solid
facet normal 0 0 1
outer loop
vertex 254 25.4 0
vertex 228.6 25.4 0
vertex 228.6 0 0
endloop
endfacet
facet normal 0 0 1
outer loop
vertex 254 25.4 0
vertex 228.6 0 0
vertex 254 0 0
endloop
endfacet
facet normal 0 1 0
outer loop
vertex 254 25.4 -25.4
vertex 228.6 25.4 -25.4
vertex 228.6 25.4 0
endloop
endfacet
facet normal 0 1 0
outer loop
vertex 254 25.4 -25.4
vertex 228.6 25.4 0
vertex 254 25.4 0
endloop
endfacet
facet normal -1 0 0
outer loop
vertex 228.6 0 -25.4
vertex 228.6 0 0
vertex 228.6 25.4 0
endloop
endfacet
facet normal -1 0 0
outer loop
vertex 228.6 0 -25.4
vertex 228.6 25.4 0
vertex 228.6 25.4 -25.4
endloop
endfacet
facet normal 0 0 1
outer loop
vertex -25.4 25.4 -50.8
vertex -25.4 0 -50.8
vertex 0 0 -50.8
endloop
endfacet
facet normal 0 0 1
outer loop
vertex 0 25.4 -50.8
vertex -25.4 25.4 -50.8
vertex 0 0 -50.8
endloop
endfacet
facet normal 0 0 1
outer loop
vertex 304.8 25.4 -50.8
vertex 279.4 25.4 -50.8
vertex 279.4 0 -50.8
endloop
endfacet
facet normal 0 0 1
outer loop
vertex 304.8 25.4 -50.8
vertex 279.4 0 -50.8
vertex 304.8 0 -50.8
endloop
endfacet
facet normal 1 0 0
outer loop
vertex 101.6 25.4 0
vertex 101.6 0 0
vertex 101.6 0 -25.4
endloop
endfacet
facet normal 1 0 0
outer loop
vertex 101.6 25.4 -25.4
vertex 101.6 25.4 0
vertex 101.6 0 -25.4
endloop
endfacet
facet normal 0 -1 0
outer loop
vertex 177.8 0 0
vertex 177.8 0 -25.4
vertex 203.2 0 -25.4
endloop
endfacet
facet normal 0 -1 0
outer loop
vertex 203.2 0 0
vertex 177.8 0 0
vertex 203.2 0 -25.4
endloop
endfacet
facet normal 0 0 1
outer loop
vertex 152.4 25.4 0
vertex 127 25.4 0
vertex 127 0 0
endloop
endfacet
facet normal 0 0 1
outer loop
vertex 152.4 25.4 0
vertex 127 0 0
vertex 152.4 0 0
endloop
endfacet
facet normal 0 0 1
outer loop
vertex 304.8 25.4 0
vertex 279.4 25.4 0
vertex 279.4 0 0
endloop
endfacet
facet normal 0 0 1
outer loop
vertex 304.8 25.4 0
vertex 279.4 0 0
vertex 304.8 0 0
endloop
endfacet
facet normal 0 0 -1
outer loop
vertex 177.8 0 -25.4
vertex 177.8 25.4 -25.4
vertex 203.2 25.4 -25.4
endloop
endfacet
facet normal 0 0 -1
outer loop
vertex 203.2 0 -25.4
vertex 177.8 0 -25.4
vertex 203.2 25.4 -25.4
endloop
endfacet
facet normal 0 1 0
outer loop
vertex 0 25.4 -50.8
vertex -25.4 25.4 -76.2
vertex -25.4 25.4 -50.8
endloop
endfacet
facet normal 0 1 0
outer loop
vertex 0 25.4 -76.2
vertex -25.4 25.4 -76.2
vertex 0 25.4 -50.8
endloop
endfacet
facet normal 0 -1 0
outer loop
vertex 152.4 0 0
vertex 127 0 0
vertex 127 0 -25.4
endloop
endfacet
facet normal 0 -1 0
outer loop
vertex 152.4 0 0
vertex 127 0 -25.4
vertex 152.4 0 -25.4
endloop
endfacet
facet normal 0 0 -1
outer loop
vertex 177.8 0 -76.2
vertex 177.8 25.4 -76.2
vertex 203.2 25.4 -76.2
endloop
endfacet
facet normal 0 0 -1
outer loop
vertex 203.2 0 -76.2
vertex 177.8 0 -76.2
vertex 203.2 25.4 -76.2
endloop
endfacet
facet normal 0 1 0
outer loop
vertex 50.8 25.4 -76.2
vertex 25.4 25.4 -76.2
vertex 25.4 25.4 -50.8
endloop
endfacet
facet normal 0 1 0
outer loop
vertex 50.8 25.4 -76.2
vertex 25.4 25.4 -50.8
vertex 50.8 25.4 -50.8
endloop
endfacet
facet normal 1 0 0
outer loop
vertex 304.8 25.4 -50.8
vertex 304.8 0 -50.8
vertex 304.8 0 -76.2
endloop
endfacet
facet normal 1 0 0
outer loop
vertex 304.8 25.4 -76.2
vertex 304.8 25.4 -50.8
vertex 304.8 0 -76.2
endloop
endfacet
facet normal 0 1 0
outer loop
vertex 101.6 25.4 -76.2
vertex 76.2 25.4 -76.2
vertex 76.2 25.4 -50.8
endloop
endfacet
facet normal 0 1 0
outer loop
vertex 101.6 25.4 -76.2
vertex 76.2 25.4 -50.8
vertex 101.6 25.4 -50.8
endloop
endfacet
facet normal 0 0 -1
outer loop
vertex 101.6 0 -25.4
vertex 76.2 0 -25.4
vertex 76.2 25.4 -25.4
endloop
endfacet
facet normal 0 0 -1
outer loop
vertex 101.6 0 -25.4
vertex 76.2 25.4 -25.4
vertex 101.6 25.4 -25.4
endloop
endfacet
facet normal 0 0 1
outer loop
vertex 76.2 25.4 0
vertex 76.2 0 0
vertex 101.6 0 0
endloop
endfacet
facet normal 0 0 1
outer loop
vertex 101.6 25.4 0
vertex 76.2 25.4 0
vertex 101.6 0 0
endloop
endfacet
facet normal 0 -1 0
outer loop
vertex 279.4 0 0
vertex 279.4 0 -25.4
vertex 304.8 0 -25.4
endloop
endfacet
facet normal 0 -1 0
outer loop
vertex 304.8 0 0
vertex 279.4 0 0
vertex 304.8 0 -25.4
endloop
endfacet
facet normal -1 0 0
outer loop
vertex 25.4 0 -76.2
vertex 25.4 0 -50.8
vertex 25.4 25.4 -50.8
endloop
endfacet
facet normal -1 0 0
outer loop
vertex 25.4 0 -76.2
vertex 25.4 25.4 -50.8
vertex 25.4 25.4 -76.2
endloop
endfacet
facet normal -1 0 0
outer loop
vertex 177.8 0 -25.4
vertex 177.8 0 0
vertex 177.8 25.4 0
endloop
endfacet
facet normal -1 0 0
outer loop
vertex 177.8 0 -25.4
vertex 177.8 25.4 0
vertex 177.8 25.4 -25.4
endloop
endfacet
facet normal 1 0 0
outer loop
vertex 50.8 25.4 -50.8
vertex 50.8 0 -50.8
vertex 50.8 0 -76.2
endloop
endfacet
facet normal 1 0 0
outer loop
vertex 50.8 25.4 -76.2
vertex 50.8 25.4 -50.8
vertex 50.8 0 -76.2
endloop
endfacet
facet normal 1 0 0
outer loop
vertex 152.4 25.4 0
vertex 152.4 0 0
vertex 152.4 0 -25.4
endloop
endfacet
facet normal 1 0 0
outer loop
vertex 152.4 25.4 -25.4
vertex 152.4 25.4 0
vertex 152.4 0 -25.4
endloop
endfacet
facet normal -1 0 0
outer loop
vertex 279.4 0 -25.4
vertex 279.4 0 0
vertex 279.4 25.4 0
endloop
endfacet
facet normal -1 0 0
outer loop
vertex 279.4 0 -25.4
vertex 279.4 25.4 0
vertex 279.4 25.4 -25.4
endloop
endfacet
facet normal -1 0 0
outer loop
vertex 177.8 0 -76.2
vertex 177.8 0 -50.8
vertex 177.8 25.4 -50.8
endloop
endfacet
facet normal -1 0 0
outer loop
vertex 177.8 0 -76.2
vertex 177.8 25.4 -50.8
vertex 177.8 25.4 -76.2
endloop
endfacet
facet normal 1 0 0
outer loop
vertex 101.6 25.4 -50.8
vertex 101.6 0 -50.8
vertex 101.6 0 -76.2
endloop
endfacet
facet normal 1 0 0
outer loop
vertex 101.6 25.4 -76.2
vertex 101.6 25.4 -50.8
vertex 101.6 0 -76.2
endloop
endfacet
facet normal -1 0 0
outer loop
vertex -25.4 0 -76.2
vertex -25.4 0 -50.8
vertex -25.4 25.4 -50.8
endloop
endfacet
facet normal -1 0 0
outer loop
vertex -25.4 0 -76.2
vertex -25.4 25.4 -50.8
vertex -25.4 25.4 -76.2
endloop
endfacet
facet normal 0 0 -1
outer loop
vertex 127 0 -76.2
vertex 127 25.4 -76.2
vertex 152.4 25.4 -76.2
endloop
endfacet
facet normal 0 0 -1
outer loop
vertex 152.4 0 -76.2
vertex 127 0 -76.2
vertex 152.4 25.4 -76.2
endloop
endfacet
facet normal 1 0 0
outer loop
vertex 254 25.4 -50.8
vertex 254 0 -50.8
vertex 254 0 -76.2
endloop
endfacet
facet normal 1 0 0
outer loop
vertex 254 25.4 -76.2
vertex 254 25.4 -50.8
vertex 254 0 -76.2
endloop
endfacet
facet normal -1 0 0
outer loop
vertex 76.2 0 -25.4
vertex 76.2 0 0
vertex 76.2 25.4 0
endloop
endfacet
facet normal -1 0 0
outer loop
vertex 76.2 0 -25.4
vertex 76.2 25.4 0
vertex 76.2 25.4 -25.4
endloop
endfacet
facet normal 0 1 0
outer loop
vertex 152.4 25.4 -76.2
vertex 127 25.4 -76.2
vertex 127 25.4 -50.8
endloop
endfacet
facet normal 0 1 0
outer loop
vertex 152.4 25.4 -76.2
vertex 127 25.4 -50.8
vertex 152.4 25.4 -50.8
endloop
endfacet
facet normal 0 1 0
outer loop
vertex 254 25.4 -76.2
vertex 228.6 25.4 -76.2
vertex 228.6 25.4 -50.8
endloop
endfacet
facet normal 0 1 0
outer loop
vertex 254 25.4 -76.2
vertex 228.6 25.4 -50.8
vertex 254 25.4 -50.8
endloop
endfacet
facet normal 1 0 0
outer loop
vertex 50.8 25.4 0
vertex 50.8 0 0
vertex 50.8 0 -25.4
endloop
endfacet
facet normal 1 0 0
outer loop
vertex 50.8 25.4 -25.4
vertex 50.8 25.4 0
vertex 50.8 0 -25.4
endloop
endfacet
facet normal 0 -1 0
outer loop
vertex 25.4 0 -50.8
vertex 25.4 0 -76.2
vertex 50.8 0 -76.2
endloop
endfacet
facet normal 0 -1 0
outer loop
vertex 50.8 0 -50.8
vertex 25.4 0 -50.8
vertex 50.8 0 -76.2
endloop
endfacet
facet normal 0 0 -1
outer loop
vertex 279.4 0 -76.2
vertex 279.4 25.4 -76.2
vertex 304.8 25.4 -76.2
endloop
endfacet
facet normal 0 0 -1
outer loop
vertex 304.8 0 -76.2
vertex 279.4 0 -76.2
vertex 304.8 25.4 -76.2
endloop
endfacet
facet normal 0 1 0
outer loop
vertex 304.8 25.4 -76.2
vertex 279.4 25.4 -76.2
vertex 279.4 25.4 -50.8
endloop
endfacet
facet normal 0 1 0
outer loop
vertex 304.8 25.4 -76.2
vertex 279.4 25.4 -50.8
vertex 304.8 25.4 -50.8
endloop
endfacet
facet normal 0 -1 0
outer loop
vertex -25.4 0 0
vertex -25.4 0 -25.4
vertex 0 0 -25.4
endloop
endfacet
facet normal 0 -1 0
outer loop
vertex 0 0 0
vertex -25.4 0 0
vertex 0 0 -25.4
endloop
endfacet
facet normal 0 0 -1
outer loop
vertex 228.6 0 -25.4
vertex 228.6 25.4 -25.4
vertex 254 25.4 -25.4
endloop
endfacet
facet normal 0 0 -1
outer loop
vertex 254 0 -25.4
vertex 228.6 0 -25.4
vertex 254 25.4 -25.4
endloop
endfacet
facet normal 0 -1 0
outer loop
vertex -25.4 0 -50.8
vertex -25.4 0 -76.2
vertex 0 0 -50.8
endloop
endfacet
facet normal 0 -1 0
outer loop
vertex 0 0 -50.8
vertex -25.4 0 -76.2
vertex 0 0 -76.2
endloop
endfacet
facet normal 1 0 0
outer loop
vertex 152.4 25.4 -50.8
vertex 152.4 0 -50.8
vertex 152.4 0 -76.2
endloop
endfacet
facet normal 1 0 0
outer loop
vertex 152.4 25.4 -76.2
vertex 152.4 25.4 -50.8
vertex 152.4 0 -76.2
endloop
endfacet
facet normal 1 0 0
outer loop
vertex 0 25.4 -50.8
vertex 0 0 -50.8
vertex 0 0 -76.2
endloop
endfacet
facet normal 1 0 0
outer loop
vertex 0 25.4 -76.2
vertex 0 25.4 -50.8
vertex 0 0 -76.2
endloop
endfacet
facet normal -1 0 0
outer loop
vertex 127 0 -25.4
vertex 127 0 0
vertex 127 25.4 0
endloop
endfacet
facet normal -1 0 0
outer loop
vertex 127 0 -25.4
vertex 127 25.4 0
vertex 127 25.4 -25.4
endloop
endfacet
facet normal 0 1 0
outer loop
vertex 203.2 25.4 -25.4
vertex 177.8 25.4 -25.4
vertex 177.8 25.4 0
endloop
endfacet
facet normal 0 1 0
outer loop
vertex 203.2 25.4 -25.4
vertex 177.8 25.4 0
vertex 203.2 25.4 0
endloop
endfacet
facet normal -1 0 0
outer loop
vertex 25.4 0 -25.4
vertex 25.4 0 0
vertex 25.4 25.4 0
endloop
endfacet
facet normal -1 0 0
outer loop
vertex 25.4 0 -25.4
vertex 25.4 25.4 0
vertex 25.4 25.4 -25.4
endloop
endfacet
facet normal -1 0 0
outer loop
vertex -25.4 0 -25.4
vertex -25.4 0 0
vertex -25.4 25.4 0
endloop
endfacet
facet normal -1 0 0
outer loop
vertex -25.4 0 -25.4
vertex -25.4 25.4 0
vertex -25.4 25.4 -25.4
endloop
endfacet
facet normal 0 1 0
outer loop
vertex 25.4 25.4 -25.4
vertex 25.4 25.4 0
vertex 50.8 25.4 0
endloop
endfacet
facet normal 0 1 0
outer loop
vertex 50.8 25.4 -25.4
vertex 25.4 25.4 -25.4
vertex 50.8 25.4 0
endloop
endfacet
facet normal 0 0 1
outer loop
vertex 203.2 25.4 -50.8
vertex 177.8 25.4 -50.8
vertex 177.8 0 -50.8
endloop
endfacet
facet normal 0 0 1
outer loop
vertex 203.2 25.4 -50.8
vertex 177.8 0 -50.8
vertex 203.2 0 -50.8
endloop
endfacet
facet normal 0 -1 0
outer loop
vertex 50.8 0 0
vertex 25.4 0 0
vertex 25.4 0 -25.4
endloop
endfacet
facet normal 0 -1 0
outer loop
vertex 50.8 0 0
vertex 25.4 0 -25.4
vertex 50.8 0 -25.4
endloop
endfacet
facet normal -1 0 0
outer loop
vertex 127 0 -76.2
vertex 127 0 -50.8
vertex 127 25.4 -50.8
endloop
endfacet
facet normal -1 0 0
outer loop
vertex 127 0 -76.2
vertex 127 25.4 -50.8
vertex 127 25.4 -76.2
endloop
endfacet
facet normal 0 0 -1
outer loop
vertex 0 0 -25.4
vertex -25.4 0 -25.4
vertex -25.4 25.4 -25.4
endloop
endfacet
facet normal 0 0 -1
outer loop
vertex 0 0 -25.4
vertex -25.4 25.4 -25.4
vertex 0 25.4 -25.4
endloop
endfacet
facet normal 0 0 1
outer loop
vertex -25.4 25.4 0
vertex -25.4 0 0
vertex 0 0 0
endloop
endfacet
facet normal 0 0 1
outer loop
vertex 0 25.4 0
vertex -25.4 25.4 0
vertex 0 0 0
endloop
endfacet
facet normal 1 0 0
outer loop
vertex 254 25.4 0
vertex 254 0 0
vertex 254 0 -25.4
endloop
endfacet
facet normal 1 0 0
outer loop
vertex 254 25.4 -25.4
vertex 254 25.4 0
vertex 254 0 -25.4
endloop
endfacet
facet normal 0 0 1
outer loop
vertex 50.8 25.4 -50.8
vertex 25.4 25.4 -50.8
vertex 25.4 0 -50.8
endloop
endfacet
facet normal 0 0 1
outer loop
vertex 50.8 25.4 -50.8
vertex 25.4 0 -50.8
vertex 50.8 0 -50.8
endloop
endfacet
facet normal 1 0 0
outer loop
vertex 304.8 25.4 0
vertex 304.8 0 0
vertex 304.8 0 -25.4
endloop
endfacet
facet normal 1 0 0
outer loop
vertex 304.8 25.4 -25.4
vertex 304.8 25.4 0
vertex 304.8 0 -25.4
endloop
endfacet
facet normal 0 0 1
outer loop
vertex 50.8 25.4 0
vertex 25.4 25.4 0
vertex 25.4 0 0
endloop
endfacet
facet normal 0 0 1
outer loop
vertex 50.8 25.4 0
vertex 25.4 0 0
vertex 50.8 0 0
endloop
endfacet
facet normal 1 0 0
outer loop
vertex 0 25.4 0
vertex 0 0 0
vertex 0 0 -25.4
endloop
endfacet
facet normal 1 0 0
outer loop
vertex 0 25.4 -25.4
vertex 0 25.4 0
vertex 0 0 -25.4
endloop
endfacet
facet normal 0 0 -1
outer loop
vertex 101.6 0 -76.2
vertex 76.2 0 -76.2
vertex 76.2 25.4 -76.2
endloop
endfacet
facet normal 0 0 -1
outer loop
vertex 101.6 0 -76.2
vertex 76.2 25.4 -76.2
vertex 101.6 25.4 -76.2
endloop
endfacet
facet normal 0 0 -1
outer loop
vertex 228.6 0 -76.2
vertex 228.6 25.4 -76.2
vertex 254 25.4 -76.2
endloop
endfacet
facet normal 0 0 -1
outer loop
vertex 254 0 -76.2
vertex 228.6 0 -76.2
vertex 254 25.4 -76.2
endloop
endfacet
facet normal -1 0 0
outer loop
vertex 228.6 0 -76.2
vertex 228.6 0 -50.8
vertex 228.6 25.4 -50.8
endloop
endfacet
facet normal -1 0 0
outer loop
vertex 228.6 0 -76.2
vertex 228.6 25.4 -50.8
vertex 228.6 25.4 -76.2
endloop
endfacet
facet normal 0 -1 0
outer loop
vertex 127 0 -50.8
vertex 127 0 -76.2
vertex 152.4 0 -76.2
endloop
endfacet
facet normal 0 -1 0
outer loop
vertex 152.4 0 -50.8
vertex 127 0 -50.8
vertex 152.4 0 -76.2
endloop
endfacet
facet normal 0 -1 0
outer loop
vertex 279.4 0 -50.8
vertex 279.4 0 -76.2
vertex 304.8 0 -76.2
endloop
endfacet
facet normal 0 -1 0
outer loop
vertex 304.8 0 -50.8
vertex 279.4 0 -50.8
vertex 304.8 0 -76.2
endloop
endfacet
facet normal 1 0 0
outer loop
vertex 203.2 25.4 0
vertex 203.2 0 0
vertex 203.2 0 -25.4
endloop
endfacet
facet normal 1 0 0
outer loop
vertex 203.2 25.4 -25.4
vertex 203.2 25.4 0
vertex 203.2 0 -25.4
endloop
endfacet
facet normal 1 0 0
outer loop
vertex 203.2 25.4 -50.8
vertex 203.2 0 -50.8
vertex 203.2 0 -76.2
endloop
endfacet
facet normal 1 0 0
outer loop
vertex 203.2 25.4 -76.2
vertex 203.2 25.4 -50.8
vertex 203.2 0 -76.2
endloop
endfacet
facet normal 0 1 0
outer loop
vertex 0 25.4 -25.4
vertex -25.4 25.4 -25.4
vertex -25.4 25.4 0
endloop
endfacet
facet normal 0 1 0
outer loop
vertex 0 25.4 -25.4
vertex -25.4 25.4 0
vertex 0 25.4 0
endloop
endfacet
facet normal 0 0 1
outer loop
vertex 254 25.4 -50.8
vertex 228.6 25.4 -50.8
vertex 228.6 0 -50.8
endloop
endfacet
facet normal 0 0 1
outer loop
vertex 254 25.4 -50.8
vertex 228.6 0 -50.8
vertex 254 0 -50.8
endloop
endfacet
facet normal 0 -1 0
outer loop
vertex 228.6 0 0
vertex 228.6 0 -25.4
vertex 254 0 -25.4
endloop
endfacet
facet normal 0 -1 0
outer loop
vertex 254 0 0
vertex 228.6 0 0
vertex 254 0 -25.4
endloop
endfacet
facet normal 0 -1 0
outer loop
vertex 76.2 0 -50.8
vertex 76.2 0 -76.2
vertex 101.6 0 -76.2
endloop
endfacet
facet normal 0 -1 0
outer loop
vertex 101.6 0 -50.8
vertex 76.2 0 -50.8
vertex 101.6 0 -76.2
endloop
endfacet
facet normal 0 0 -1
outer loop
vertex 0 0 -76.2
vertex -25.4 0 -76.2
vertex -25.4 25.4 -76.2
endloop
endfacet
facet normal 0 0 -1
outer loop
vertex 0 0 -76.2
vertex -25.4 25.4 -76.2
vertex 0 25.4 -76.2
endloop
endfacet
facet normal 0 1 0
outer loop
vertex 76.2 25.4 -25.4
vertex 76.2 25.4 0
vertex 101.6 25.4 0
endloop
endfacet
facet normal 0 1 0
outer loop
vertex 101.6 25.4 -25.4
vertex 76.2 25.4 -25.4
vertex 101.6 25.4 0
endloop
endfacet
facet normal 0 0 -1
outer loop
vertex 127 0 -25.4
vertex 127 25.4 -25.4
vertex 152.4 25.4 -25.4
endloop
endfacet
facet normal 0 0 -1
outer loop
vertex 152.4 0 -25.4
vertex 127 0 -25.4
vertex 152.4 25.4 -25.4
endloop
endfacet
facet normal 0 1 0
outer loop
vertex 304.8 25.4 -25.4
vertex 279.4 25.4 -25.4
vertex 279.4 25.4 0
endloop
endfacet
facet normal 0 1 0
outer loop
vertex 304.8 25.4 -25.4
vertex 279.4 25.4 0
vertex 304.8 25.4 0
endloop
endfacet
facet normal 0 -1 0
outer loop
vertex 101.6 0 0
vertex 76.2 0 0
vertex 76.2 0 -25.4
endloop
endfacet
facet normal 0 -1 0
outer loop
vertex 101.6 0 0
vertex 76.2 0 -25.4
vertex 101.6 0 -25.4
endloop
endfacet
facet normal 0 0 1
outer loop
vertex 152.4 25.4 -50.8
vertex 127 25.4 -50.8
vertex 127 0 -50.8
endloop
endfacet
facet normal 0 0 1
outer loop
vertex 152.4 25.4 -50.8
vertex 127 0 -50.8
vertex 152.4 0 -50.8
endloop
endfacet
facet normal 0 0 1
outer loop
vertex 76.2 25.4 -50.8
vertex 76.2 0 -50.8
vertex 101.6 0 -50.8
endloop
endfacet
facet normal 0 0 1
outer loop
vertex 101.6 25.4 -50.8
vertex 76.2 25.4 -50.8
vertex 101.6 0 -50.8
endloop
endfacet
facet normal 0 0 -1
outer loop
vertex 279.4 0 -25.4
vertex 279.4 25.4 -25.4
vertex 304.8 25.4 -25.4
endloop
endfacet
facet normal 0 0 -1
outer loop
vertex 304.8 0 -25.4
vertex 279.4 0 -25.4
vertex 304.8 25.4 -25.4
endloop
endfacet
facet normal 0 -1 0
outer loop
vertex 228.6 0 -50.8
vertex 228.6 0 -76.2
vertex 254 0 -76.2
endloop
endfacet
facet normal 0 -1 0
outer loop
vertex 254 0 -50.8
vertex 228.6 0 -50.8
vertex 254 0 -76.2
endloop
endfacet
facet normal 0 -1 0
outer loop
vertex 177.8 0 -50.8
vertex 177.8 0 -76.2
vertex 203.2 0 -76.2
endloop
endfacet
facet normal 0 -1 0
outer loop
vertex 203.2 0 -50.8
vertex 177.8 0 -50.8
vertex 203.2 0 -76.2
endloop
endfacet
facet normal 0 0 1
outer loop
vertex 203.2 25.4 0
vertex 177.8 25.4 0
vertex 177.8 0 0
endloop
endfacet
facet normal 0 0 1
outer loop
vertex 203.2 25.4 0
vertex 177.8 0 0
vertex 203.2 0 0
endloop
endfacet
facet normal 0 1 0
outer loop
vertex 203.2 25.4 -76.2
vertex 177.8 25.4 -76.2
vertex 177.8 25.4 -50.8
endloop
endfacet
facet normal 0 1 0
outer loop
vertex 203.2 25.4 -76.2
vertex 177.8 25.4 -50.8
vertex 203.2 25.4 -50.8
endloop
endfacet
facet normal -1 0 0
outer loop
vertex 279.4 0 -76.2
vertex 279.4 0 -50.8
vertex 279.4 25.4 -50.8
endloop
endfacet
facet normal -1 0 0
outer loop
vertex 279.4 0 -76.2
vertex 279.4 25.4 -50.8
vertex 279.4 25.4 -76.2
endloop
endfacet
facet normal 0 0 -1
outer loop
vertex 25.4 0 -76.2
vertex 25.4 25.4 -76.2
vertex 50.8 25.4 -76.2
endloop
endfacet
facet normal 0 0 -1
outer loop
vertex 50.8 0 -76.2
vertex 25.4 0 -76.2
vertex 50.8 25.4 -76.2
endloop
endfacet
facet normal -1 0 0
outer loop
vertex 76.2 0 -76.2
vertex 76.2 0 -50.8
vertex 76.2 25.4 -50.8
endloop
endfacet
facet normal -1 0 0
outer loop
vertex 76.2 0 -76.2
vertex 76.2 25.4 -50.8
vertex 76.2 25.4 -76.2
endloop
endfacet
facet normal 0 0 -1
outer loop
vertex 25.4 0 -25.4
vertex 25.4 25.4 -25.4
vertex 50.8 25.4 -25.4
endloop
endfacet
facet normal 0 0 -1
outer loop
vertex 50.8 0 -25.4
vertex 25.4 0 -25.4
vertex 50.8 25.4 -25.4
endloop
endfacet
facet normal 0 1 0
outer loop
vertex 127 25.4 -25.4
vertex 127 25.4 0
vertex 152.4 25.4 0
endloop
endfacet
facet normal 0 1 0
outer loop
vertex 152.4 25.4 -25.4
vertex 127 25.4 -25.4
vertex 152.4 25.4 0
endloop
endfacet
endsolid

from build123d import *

# Parameters (mm, degrees)
SKETCH1_W              = 25.4
SKETCH1_H              = 25.4
BOSS_EXTRUDE1_DEPTH    = 25.4
BOSS_EXTRUDE1_2_DEPTH  = 25.4
BOSS_EXTRUDE1_3_DEPTH  = 25.4
BOSS_EXTRUDE1_4_DEPTH  = 25.4
BOSS_EXTRUDE1_5_DEPTH  = 25.4
BOSS_EXTRUDE1_6_DEPTH  = 25.4
BOSS_EXTRUDE1_7_DEPTH  = 25.4
BOSS_EXTRUDE1_8_DEPTH  = 25.4
BOSS_EXTRUDE1_9_DEPTH  = 25.4
BOSS_EXTRUDE1_10_DEPTH = 25.4
BOSS_EXTRUDE1_11_DEPTH = 25.4
BOSS_EXTRUDE1_12_DEPTH = 25.4
BOSS_EXTRUDE1_13_DEPTH = 25.4
BOSS_EXTRUDE1_14_DEPTH = 25.4


with BuildPart() as part:
    # Sketch1 → Boss-Extrude1 (new body)
    with BuildSketch(Plane(origin=(0, 0, 0), x_dir=(1, 0, 0), z_dir=(0, 1, 0))):
        with Locations((38.1, 12.7)):
            Rectangle(SKETCH1_W, SKETCH1_H)
    extrude(amount=BOSS_EXTRUDE1_DEPTH)


with BuildPart() as body_2:
    # Sketch1 → Boss-Extrude1 2 (new body)
    with BuildSketch(Plane(origin=(0, 0, 0), x_dir=(1, 0, 0), z_dir=(0, 1, 0))):
        with Locations((-12.7, 12.7)):
            Rectangle(SKETCH1_W, SKETCH1_H)
    extrude(amount=BOSS_EXTRUDE1_2_DEPTH)


with BuildPart() as body_3:
    # Sketch1 → Boss-Extrude1 3 (new body)
    with BuildSketch(Plane(origin=(0, 0, 0), x_dir=(1, 0, 0), z_dir=(0, 1, 0))):
        with Locations((88.9, 12.7)):
            Rectangle(SKETCH1_W, SKETCH1_H)
    extrude(amount=BOSS_EXTRUDE1_3_DEPTH)


with BuildPart() as body_4:
    # Sketch1 → Boss-Extrude1 4 (new body)
    with BuildSketch(Plane(origin=(0, 0, 0), x_dir=(1, 0, 0), z_dir=(0, 1, 0))):
        with Locations((139.7, 12.7)):
            Rectangle(SKETCH1_W, SKETCH1_H)
    extrude(amount=BOSS_EXTRUDE1_4_DEPTH)


with BuildPart() as body_5:
    # Sketch1 → Boss-Extrude1 5 (new body)
    with BuildSketch(Plane(origin=(0, 0, 0), x_dir=(1, 0, 0), z_dir=(0, 1, 0))):
        with Locations((190.5, 12.7)):
            Rectangle(SKETCH1_W, SKETCH1_H)
    extrude(amount=BOSS_EXTRUDE1_5_DEPTH)


with BuildPart() as body_6:
    # Sketch1 → Boss-Extrude1 6 (new body)
    with BuildSketch(Plane(origin=(0, 0, 0), x_dir=(1, 0, 0), z_dir=(0, 1, 0))):
        with Locations((241.3, 12.7)):
            Rectangle(SKETCH1_W, SKETCH1_H)
    extrude(amount=BOSS_EXTRUDE1_6_DEPTH)


with BuildPart() as body_7:
    # Sketch1 → Boss-Extrude1 7 (new body)
    with BuildSketch(Plane(origin=(0, 0, 0), x_dir=(1, 0, 0), z_dir=(0, 1, 0))):
        with Locations((292.1, 12.7)):
            Rectangle(SKETCH1_W, SKETCH1_H)
    extrude(amount=BOSS_EXTRUDE1_7_DEPTH)


with BuildPart() as body_8:
    # Sketch1 → Boss-Extrude1 8 (new body)
    with BuildSketch(Plane(origin=(0, 0, 0), x_dir=(1, 0, 0), z_dir=(0, 1, 0))):
        with Locations((38.1, 63.5)):
            Rectangle(SKETCH1_W, SKETCH1_H)
    extrude(amount=BOSS_EXTRUDE1_8_DEPTH)


with BuildPart() as body_9:
    # Sketch1 → Boss-Extrude1 9 (new body)
    with BuildSketch(Plane(origin=(0, 0, 0), x_dir=(1, 0, 0), z_dir=(0, 1, 0))):
        with Locations((88.9, 63.5)):
            Rectangle(SKETCH1_W, SKETCH1_H)
    extrude(amount=BOSS_EXTRUDE1_9_DEPTH)


with BuildPart() as body_10:
    # Sketch1 → Boss-Extrude1 10 (new body)
    with BuildSketch(Plane(origin=(0, 0, 0), x_dir=(1, 0, 0), z_dir=(0, 1, 0))):
        with Locations((139.7, 63.5)):
            Rectangle(SKETCH1_W, SKETCH1_H)
    extrude(amount=BOSS_EXTRUDE1_10_DEPTH)


with BuildPart() as body_11:
    # Sketch1 → Boss-Extrude1 11 (new body)
    with BuildSketch(Plane(origin=(0, 0, 0), x_dir=(1, 0, 0), z_dir=(0, 1, 0))):
        with Locations((190.5, 63.5)):
            Rectangle(SKETCH1_W, SKETCH1_H)
    extrude(amount=BOSS_EXTRUDE1_11_DEPTH)


with BuildPart() as body_12:
    # Sketch1 → Boss-Extrude1 12 (new body)
    with BuildSketch(Plane(origin=(0, 0, 0), x_dir=(1, 0, 0), z_dir=(0, 1, 0))):
        with Locations((241.3, 63.5)):
            Rectangle(SKETCH1_W, SKETCH1_H)
    extrude(amount=BOSS_EXTRUDE1_12_DEPTH)


with BuildPart() as body_13:
    # Sketch1 → Boss-Extrude1 13 (new body)
    with BuildSketch(Plane(origin=(0, 0, 0), x_dir=(1, 0, 0), z_dir=(0, 1, 0))):
        with Locations((292.1, 63.5)):
            Rectangle(SKETCH1_W, SKETCH1_H)
    extrude(amount=BOSS_EXTRUDE1_13_DEPTH)


with BuildPart() as body_14:
    # Sketch1 → Boss-Extrude1 14 (new body)
    with BuildSketch(Plane(origin=(0, 0, 0), x_dir=(1, 0, 0), z_dir=(0, 1, 0))):
        with Locations((-12.7, 63.5)):
            Rectangle(SKETCH1_W, SKETCH1_H)
    extrude(amount=BOSS_EXTRUDE1_14_DEPTH)


solid = Compound([part.part, body_2.part, body_3.part, body_4.part, body_5.part, body_6.part, body_7.part, body_8.part, body_9.part, body_10.part, body_11.part, body_12.part, body_13.part, body_14.part])
